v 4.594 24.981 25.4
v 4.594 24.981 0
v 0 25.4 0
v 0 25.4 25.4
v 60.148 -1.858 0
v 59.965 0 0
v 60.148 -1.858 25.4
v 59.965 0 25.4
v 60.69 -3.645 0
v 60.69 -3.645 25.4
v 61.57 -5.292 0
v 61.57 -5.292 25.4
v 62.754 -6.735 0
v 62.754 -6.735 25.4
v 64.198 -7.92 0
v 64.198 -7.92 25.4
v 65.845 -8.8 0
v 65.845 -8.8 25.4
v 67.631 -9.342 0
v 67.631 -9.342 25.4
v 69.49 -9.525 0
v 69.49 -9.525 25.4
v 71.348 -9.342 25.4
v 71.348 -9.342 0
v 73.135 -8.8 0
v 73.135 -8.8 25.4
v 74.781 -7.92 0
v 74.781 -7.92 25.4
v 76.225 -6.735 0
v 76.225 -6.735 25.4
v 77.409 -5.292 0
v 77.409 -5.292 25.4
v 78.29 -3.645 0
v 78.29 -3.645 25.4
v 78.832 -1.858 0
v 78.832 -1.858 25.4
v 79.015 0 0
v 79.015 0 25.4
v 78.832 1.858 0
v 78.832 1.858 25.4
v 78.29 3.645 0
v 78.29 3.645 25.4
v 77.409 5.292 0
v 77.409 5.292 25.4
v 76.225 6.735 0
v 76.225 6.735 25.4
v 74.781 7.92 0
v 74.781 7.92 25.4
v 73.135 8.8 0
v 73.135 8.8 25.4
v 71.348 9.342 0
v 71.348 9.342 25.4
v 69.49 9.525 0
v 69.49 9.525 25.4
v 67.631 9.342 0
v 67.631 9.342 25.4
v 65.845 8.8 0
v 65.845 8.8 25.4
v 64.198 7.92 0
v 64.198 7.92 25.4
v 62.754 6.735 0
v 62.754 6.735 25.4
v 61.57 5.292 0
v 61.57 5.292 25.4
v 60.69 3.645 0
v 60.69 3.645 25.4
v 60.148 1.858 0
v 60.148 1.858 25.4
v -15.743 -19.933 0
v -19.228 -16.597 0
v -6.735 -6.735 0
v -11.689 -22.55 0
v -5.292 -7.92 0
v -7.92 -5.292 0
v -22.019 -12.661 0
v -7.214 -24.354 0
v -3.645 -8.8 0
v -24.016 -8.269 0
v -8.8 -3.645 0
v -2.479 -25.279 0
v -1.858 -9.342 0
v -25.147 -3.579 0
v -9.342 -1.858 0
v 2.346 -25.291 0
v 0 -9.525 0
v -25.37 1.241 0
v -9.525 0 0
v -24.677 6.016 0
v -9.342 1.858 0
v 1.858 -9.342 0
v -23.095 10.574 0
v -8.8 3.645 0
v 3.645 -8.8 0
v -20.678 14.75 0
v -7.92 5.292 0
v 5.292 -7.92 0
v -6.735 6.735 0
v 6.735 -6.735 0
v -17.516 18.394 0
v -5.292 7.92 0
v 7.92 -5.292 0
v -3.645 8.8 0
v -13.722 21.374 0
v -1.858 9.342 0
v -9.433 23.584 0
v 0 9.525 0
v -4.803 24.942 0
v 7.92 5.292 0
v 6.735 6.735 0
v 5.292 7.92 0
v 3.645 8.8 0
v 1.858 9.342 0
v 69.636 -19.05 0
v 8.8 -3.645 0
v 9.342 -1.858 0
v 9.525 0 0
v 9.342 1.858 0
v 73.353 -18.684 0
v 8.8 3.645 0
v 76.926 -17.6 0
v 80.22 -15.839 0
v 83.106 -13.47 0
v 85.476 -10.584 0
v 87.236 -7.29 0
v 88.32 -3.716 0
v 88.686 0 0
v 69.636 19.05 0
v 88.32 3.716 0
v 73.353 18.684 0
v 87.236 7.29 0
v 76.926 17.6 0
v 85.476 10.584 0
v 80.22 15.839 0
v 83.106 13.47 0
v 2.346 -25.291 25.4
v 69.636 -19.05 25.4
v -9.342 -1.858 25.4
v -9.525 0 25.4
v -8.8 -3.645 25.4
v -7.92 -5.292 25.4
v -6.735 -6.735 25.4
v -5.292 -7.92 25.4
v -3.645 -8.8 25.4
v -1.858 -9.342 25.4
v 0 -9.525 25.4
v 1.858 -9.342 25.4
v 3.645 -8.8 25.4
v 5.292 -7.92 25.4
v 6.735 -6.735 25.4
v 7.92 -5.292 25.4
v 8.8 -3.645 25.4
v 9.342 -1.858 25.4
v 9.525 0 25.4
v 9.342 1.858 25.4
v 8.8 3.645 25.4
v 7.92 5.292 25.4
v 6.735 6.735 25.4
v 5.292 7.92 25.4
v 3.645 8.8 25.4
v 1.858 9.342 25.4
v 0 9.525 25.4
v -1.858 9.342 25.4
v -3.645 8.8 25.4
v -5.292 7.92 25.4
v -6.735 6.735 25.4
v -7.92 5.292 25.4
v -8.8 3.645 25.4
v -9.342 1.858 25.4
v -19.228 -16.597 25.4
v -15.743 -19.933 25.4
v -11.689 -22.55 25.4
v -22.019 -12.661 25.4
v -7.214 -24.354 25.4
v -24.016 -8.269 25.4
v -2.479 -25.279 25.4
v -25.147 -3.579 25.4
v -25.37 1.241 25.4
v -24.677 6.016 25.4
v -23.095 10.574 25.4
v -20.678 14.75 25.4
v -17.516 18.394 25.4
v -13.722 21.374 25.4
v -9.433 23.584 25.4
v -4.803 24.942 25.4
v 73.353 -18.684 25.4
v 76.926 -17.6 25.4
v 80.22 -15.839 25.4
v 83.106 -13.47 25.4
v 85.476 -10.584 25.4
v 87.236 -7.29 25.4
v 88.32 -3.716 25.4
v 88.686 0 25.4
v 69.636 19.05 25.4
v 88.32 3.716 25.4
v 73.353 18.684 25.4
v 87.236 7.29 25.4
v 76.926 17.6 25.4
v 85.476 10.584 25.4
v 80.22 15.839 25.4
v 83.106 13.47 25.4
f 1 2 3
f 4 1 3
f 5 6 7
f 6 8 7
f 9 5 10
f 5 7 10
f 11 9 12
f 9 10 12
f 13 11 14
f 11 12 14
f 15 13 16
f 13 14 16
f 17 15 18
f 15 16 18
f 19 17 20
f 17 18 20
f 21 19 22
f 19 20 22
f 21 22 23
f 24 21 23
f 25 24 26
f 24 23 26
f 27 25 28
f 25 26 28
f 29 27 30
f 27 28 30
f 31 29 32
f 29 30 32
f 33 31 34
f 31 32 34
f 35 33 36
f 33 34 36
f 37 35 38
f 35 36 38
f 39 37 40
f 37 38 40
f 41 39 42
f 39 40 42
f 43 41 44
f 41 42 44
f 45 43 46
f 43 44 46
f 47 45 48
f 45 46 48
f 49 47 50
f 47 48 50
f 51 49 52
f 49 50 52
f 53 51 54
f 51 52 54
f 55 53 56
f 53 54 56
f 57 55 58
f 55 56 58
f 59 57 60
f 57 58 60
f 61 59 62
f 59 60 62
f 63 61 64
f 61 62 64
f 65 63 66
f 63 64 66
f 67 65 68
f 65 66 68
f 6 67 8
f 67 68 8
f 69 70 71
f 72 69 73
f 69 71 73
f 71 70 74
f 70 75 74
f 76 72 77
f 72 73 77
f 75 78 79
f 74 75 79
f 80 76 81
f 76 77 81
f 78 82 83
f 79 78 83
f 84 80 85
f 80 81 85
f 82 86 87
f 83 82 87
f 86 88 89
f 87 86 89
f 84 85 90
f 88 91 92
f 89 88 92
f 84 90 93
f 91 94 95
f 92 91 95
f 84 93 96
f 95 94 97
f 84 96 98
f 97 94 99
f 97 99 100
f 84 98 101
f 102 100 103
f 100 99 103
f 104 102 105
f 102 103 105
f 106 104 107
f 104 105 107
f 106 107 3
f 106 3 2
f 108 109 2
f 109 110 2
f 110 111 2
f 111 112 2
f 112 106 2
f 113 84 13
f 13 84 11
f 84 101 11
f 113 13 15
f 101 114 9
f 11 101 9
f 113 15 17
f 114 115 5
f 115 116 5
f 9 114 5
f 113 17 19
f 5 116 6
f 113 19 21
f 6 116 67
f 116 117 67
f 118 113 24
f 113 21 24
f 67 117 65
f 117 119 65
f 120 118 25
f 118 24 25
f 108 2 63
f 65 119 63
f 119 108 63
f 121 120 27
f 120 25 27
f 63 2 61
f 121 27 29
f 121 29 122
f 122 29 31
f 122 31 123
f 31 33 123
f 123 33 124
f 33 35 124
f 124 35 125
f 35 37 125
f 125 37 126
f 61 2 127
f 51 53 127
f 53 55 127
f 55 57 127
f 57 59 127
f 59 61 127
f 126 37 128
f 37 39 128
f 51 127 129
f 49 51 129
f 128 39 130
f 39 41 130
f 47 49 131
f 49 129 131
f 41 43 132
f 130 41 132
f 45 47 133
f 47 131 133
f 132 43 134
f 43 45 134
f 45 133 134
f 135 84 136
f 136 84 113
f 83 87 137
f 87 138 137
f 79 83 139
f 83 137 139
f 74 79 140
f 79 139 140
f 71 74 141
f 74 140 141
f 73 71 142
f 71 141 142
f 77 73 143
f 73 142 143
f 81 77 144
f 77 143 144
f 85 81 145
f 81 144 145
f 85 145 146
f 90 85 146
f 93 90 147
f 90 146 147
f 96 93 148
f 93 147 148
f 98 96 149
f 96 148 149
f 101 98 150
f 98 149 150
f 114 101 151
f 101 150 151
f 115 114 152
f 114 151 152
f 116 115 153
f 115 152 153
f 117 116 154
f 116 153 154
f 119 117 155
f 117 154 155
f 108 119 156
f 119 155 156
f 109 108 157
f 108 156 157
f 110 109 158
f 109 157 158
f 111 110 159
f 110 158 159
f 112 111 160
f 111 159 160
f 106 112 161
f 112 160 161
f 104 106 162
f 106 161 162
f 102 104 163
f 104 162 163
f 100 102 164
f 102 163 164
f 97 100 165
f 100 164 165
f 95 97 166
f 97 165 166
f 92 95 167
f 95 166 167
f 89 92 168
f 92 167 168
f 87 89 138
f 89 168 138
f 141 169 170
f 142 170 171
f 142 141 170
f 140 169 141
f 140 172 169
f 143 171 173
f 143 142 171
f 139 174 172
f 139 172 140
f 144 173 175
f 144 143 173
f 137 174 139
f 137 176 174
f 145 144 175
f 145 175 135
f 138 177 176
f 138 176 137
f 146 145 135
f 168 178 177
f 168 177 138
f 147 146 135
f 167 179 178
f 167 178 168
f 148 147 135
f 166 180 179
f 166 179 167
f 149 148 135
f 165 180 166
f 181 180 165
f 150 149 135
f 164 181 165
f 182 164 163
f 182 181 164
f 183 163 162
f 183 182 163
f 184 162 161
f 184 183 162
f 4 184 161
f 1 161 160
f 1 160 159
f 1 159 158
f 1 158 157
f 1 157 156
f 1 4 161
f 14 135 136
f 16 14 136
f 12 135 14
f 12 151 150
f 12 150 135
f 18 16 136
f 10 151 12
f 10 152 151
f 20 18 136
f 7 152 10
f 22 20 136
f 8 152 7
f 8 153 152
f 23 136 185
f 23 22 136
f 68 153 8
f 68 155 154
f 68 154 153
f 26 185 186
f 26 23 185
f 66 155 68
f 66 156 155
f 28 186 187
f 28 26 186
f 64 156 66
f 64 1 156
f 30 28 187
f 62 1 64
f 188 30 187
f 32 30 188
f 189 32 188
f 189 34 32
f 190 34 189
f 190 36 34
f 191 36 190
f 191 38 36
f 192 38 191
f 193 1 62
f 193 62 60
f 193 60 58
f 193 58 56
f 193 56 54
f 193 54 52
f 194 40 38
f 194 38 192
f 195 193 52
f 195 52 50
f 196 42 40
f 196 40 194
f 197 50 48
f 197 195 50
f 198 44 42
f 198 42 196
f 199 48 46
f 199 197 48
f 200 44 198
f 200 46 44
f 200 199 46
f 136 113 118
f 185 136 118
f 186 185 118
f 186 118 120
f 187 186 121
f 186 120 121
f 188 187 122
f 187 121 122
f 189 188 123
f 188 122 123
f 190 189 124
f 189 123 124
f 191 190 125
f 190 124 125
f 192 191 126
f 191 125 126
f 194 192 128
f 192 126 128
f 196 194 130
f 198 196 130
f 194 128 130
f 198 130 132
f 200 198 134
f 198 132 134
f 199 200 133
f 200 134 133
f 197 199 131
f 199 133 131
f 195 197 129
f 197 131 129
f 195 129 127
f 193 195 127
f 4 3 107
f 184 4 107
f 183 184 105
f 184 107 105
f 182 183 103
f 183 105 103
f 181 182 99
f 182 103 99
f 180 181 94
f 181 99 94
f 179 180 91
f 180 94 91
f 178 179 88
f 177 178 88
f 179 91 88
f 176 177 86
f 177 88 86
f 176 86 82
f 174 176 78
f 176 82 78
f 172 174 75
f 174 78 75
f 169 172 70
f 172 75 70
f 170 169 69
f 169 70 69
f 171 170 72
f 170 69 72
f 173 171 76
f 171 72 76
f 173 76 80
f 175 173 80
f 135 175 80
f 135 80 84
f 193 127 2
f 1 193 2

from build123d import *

# Parameters (mm, degrees)
F2_DEPTH = 25.4
F3_D     = 19.05
F3_DEPTH = 25.4
F3_TIP   = 5.7231973962


with BuildPart() as f2:
    # F0 (on Top) → F2 (new body)
    with BuildSketch(Plane.XY):
        with BuildLine():
            ThreePointArc((2.3458816171, -25.2914380658), (18.7715928077, -17.1110287085), (25.4, 0))
            ThreePointArc((25.4, 0), (19.5173228231, 16.2552794445), (4.5941645813, 24.981065866))
            Line((4.5941645813, 24.981065866), (0, 25.4))
            ThreePointArc((0, 25.4), (-25.3728450008, -1.1741961351), (2.3458816171, -25.2914380658))
        make_face()
        with BuildLine():
            ThreePointArc((4.5941645813, 24.981065866), (19.5173228231, 16.2552794445), (25.4, 0))
            ThreePointArc((25.4, 0), (18.7715928077, -17.1110287085), (2.3458816171, -25.2914380658))
            Line((2.3458816171, -25.2914380658), (69.6361139417, -19.05))
            ThreePointArc((69.6361139417, -19.05), (50.5861139417, 0), (69.6361139417, 19.05))
            Line((69.6361139417, 19.05), (4.5941645813, 24.981065866))
        make_face()
        with BuildLine():
            ThreePointArc((88.6861139417, 0), (83.1064981233, 13.4703841816), (69.6361139417, 19.05))
            ThreePointArc((69.6361139417, 19.05), (50.5861139417, 0), (69.6361139417, -19.05))
            ThreePointArc((69.6361139417, -19.05), (83.1064981233, -13.4703841816), (88.6861139417, 0))
        make_face()
    extrude(amount=F2_DEPTH)

    # F3
    with Locations(Plane(origin=(0, 0, 0), x_dir=(1, 0, 0), z_dir=(0, 0, -1))):
        with Locations((0, 0), (69.4895982742, 0)):
            Hole(F3_D / 2, depth=F3_DEPTH)
            with Locations((0, 0, -(F3_DEPTH + F3_TIP / 2))):  # 118° drill point
                Cone(0, F3_D / 2, F3_TIP, mode=Mode.SUBTRACT)


solid = f2.part
